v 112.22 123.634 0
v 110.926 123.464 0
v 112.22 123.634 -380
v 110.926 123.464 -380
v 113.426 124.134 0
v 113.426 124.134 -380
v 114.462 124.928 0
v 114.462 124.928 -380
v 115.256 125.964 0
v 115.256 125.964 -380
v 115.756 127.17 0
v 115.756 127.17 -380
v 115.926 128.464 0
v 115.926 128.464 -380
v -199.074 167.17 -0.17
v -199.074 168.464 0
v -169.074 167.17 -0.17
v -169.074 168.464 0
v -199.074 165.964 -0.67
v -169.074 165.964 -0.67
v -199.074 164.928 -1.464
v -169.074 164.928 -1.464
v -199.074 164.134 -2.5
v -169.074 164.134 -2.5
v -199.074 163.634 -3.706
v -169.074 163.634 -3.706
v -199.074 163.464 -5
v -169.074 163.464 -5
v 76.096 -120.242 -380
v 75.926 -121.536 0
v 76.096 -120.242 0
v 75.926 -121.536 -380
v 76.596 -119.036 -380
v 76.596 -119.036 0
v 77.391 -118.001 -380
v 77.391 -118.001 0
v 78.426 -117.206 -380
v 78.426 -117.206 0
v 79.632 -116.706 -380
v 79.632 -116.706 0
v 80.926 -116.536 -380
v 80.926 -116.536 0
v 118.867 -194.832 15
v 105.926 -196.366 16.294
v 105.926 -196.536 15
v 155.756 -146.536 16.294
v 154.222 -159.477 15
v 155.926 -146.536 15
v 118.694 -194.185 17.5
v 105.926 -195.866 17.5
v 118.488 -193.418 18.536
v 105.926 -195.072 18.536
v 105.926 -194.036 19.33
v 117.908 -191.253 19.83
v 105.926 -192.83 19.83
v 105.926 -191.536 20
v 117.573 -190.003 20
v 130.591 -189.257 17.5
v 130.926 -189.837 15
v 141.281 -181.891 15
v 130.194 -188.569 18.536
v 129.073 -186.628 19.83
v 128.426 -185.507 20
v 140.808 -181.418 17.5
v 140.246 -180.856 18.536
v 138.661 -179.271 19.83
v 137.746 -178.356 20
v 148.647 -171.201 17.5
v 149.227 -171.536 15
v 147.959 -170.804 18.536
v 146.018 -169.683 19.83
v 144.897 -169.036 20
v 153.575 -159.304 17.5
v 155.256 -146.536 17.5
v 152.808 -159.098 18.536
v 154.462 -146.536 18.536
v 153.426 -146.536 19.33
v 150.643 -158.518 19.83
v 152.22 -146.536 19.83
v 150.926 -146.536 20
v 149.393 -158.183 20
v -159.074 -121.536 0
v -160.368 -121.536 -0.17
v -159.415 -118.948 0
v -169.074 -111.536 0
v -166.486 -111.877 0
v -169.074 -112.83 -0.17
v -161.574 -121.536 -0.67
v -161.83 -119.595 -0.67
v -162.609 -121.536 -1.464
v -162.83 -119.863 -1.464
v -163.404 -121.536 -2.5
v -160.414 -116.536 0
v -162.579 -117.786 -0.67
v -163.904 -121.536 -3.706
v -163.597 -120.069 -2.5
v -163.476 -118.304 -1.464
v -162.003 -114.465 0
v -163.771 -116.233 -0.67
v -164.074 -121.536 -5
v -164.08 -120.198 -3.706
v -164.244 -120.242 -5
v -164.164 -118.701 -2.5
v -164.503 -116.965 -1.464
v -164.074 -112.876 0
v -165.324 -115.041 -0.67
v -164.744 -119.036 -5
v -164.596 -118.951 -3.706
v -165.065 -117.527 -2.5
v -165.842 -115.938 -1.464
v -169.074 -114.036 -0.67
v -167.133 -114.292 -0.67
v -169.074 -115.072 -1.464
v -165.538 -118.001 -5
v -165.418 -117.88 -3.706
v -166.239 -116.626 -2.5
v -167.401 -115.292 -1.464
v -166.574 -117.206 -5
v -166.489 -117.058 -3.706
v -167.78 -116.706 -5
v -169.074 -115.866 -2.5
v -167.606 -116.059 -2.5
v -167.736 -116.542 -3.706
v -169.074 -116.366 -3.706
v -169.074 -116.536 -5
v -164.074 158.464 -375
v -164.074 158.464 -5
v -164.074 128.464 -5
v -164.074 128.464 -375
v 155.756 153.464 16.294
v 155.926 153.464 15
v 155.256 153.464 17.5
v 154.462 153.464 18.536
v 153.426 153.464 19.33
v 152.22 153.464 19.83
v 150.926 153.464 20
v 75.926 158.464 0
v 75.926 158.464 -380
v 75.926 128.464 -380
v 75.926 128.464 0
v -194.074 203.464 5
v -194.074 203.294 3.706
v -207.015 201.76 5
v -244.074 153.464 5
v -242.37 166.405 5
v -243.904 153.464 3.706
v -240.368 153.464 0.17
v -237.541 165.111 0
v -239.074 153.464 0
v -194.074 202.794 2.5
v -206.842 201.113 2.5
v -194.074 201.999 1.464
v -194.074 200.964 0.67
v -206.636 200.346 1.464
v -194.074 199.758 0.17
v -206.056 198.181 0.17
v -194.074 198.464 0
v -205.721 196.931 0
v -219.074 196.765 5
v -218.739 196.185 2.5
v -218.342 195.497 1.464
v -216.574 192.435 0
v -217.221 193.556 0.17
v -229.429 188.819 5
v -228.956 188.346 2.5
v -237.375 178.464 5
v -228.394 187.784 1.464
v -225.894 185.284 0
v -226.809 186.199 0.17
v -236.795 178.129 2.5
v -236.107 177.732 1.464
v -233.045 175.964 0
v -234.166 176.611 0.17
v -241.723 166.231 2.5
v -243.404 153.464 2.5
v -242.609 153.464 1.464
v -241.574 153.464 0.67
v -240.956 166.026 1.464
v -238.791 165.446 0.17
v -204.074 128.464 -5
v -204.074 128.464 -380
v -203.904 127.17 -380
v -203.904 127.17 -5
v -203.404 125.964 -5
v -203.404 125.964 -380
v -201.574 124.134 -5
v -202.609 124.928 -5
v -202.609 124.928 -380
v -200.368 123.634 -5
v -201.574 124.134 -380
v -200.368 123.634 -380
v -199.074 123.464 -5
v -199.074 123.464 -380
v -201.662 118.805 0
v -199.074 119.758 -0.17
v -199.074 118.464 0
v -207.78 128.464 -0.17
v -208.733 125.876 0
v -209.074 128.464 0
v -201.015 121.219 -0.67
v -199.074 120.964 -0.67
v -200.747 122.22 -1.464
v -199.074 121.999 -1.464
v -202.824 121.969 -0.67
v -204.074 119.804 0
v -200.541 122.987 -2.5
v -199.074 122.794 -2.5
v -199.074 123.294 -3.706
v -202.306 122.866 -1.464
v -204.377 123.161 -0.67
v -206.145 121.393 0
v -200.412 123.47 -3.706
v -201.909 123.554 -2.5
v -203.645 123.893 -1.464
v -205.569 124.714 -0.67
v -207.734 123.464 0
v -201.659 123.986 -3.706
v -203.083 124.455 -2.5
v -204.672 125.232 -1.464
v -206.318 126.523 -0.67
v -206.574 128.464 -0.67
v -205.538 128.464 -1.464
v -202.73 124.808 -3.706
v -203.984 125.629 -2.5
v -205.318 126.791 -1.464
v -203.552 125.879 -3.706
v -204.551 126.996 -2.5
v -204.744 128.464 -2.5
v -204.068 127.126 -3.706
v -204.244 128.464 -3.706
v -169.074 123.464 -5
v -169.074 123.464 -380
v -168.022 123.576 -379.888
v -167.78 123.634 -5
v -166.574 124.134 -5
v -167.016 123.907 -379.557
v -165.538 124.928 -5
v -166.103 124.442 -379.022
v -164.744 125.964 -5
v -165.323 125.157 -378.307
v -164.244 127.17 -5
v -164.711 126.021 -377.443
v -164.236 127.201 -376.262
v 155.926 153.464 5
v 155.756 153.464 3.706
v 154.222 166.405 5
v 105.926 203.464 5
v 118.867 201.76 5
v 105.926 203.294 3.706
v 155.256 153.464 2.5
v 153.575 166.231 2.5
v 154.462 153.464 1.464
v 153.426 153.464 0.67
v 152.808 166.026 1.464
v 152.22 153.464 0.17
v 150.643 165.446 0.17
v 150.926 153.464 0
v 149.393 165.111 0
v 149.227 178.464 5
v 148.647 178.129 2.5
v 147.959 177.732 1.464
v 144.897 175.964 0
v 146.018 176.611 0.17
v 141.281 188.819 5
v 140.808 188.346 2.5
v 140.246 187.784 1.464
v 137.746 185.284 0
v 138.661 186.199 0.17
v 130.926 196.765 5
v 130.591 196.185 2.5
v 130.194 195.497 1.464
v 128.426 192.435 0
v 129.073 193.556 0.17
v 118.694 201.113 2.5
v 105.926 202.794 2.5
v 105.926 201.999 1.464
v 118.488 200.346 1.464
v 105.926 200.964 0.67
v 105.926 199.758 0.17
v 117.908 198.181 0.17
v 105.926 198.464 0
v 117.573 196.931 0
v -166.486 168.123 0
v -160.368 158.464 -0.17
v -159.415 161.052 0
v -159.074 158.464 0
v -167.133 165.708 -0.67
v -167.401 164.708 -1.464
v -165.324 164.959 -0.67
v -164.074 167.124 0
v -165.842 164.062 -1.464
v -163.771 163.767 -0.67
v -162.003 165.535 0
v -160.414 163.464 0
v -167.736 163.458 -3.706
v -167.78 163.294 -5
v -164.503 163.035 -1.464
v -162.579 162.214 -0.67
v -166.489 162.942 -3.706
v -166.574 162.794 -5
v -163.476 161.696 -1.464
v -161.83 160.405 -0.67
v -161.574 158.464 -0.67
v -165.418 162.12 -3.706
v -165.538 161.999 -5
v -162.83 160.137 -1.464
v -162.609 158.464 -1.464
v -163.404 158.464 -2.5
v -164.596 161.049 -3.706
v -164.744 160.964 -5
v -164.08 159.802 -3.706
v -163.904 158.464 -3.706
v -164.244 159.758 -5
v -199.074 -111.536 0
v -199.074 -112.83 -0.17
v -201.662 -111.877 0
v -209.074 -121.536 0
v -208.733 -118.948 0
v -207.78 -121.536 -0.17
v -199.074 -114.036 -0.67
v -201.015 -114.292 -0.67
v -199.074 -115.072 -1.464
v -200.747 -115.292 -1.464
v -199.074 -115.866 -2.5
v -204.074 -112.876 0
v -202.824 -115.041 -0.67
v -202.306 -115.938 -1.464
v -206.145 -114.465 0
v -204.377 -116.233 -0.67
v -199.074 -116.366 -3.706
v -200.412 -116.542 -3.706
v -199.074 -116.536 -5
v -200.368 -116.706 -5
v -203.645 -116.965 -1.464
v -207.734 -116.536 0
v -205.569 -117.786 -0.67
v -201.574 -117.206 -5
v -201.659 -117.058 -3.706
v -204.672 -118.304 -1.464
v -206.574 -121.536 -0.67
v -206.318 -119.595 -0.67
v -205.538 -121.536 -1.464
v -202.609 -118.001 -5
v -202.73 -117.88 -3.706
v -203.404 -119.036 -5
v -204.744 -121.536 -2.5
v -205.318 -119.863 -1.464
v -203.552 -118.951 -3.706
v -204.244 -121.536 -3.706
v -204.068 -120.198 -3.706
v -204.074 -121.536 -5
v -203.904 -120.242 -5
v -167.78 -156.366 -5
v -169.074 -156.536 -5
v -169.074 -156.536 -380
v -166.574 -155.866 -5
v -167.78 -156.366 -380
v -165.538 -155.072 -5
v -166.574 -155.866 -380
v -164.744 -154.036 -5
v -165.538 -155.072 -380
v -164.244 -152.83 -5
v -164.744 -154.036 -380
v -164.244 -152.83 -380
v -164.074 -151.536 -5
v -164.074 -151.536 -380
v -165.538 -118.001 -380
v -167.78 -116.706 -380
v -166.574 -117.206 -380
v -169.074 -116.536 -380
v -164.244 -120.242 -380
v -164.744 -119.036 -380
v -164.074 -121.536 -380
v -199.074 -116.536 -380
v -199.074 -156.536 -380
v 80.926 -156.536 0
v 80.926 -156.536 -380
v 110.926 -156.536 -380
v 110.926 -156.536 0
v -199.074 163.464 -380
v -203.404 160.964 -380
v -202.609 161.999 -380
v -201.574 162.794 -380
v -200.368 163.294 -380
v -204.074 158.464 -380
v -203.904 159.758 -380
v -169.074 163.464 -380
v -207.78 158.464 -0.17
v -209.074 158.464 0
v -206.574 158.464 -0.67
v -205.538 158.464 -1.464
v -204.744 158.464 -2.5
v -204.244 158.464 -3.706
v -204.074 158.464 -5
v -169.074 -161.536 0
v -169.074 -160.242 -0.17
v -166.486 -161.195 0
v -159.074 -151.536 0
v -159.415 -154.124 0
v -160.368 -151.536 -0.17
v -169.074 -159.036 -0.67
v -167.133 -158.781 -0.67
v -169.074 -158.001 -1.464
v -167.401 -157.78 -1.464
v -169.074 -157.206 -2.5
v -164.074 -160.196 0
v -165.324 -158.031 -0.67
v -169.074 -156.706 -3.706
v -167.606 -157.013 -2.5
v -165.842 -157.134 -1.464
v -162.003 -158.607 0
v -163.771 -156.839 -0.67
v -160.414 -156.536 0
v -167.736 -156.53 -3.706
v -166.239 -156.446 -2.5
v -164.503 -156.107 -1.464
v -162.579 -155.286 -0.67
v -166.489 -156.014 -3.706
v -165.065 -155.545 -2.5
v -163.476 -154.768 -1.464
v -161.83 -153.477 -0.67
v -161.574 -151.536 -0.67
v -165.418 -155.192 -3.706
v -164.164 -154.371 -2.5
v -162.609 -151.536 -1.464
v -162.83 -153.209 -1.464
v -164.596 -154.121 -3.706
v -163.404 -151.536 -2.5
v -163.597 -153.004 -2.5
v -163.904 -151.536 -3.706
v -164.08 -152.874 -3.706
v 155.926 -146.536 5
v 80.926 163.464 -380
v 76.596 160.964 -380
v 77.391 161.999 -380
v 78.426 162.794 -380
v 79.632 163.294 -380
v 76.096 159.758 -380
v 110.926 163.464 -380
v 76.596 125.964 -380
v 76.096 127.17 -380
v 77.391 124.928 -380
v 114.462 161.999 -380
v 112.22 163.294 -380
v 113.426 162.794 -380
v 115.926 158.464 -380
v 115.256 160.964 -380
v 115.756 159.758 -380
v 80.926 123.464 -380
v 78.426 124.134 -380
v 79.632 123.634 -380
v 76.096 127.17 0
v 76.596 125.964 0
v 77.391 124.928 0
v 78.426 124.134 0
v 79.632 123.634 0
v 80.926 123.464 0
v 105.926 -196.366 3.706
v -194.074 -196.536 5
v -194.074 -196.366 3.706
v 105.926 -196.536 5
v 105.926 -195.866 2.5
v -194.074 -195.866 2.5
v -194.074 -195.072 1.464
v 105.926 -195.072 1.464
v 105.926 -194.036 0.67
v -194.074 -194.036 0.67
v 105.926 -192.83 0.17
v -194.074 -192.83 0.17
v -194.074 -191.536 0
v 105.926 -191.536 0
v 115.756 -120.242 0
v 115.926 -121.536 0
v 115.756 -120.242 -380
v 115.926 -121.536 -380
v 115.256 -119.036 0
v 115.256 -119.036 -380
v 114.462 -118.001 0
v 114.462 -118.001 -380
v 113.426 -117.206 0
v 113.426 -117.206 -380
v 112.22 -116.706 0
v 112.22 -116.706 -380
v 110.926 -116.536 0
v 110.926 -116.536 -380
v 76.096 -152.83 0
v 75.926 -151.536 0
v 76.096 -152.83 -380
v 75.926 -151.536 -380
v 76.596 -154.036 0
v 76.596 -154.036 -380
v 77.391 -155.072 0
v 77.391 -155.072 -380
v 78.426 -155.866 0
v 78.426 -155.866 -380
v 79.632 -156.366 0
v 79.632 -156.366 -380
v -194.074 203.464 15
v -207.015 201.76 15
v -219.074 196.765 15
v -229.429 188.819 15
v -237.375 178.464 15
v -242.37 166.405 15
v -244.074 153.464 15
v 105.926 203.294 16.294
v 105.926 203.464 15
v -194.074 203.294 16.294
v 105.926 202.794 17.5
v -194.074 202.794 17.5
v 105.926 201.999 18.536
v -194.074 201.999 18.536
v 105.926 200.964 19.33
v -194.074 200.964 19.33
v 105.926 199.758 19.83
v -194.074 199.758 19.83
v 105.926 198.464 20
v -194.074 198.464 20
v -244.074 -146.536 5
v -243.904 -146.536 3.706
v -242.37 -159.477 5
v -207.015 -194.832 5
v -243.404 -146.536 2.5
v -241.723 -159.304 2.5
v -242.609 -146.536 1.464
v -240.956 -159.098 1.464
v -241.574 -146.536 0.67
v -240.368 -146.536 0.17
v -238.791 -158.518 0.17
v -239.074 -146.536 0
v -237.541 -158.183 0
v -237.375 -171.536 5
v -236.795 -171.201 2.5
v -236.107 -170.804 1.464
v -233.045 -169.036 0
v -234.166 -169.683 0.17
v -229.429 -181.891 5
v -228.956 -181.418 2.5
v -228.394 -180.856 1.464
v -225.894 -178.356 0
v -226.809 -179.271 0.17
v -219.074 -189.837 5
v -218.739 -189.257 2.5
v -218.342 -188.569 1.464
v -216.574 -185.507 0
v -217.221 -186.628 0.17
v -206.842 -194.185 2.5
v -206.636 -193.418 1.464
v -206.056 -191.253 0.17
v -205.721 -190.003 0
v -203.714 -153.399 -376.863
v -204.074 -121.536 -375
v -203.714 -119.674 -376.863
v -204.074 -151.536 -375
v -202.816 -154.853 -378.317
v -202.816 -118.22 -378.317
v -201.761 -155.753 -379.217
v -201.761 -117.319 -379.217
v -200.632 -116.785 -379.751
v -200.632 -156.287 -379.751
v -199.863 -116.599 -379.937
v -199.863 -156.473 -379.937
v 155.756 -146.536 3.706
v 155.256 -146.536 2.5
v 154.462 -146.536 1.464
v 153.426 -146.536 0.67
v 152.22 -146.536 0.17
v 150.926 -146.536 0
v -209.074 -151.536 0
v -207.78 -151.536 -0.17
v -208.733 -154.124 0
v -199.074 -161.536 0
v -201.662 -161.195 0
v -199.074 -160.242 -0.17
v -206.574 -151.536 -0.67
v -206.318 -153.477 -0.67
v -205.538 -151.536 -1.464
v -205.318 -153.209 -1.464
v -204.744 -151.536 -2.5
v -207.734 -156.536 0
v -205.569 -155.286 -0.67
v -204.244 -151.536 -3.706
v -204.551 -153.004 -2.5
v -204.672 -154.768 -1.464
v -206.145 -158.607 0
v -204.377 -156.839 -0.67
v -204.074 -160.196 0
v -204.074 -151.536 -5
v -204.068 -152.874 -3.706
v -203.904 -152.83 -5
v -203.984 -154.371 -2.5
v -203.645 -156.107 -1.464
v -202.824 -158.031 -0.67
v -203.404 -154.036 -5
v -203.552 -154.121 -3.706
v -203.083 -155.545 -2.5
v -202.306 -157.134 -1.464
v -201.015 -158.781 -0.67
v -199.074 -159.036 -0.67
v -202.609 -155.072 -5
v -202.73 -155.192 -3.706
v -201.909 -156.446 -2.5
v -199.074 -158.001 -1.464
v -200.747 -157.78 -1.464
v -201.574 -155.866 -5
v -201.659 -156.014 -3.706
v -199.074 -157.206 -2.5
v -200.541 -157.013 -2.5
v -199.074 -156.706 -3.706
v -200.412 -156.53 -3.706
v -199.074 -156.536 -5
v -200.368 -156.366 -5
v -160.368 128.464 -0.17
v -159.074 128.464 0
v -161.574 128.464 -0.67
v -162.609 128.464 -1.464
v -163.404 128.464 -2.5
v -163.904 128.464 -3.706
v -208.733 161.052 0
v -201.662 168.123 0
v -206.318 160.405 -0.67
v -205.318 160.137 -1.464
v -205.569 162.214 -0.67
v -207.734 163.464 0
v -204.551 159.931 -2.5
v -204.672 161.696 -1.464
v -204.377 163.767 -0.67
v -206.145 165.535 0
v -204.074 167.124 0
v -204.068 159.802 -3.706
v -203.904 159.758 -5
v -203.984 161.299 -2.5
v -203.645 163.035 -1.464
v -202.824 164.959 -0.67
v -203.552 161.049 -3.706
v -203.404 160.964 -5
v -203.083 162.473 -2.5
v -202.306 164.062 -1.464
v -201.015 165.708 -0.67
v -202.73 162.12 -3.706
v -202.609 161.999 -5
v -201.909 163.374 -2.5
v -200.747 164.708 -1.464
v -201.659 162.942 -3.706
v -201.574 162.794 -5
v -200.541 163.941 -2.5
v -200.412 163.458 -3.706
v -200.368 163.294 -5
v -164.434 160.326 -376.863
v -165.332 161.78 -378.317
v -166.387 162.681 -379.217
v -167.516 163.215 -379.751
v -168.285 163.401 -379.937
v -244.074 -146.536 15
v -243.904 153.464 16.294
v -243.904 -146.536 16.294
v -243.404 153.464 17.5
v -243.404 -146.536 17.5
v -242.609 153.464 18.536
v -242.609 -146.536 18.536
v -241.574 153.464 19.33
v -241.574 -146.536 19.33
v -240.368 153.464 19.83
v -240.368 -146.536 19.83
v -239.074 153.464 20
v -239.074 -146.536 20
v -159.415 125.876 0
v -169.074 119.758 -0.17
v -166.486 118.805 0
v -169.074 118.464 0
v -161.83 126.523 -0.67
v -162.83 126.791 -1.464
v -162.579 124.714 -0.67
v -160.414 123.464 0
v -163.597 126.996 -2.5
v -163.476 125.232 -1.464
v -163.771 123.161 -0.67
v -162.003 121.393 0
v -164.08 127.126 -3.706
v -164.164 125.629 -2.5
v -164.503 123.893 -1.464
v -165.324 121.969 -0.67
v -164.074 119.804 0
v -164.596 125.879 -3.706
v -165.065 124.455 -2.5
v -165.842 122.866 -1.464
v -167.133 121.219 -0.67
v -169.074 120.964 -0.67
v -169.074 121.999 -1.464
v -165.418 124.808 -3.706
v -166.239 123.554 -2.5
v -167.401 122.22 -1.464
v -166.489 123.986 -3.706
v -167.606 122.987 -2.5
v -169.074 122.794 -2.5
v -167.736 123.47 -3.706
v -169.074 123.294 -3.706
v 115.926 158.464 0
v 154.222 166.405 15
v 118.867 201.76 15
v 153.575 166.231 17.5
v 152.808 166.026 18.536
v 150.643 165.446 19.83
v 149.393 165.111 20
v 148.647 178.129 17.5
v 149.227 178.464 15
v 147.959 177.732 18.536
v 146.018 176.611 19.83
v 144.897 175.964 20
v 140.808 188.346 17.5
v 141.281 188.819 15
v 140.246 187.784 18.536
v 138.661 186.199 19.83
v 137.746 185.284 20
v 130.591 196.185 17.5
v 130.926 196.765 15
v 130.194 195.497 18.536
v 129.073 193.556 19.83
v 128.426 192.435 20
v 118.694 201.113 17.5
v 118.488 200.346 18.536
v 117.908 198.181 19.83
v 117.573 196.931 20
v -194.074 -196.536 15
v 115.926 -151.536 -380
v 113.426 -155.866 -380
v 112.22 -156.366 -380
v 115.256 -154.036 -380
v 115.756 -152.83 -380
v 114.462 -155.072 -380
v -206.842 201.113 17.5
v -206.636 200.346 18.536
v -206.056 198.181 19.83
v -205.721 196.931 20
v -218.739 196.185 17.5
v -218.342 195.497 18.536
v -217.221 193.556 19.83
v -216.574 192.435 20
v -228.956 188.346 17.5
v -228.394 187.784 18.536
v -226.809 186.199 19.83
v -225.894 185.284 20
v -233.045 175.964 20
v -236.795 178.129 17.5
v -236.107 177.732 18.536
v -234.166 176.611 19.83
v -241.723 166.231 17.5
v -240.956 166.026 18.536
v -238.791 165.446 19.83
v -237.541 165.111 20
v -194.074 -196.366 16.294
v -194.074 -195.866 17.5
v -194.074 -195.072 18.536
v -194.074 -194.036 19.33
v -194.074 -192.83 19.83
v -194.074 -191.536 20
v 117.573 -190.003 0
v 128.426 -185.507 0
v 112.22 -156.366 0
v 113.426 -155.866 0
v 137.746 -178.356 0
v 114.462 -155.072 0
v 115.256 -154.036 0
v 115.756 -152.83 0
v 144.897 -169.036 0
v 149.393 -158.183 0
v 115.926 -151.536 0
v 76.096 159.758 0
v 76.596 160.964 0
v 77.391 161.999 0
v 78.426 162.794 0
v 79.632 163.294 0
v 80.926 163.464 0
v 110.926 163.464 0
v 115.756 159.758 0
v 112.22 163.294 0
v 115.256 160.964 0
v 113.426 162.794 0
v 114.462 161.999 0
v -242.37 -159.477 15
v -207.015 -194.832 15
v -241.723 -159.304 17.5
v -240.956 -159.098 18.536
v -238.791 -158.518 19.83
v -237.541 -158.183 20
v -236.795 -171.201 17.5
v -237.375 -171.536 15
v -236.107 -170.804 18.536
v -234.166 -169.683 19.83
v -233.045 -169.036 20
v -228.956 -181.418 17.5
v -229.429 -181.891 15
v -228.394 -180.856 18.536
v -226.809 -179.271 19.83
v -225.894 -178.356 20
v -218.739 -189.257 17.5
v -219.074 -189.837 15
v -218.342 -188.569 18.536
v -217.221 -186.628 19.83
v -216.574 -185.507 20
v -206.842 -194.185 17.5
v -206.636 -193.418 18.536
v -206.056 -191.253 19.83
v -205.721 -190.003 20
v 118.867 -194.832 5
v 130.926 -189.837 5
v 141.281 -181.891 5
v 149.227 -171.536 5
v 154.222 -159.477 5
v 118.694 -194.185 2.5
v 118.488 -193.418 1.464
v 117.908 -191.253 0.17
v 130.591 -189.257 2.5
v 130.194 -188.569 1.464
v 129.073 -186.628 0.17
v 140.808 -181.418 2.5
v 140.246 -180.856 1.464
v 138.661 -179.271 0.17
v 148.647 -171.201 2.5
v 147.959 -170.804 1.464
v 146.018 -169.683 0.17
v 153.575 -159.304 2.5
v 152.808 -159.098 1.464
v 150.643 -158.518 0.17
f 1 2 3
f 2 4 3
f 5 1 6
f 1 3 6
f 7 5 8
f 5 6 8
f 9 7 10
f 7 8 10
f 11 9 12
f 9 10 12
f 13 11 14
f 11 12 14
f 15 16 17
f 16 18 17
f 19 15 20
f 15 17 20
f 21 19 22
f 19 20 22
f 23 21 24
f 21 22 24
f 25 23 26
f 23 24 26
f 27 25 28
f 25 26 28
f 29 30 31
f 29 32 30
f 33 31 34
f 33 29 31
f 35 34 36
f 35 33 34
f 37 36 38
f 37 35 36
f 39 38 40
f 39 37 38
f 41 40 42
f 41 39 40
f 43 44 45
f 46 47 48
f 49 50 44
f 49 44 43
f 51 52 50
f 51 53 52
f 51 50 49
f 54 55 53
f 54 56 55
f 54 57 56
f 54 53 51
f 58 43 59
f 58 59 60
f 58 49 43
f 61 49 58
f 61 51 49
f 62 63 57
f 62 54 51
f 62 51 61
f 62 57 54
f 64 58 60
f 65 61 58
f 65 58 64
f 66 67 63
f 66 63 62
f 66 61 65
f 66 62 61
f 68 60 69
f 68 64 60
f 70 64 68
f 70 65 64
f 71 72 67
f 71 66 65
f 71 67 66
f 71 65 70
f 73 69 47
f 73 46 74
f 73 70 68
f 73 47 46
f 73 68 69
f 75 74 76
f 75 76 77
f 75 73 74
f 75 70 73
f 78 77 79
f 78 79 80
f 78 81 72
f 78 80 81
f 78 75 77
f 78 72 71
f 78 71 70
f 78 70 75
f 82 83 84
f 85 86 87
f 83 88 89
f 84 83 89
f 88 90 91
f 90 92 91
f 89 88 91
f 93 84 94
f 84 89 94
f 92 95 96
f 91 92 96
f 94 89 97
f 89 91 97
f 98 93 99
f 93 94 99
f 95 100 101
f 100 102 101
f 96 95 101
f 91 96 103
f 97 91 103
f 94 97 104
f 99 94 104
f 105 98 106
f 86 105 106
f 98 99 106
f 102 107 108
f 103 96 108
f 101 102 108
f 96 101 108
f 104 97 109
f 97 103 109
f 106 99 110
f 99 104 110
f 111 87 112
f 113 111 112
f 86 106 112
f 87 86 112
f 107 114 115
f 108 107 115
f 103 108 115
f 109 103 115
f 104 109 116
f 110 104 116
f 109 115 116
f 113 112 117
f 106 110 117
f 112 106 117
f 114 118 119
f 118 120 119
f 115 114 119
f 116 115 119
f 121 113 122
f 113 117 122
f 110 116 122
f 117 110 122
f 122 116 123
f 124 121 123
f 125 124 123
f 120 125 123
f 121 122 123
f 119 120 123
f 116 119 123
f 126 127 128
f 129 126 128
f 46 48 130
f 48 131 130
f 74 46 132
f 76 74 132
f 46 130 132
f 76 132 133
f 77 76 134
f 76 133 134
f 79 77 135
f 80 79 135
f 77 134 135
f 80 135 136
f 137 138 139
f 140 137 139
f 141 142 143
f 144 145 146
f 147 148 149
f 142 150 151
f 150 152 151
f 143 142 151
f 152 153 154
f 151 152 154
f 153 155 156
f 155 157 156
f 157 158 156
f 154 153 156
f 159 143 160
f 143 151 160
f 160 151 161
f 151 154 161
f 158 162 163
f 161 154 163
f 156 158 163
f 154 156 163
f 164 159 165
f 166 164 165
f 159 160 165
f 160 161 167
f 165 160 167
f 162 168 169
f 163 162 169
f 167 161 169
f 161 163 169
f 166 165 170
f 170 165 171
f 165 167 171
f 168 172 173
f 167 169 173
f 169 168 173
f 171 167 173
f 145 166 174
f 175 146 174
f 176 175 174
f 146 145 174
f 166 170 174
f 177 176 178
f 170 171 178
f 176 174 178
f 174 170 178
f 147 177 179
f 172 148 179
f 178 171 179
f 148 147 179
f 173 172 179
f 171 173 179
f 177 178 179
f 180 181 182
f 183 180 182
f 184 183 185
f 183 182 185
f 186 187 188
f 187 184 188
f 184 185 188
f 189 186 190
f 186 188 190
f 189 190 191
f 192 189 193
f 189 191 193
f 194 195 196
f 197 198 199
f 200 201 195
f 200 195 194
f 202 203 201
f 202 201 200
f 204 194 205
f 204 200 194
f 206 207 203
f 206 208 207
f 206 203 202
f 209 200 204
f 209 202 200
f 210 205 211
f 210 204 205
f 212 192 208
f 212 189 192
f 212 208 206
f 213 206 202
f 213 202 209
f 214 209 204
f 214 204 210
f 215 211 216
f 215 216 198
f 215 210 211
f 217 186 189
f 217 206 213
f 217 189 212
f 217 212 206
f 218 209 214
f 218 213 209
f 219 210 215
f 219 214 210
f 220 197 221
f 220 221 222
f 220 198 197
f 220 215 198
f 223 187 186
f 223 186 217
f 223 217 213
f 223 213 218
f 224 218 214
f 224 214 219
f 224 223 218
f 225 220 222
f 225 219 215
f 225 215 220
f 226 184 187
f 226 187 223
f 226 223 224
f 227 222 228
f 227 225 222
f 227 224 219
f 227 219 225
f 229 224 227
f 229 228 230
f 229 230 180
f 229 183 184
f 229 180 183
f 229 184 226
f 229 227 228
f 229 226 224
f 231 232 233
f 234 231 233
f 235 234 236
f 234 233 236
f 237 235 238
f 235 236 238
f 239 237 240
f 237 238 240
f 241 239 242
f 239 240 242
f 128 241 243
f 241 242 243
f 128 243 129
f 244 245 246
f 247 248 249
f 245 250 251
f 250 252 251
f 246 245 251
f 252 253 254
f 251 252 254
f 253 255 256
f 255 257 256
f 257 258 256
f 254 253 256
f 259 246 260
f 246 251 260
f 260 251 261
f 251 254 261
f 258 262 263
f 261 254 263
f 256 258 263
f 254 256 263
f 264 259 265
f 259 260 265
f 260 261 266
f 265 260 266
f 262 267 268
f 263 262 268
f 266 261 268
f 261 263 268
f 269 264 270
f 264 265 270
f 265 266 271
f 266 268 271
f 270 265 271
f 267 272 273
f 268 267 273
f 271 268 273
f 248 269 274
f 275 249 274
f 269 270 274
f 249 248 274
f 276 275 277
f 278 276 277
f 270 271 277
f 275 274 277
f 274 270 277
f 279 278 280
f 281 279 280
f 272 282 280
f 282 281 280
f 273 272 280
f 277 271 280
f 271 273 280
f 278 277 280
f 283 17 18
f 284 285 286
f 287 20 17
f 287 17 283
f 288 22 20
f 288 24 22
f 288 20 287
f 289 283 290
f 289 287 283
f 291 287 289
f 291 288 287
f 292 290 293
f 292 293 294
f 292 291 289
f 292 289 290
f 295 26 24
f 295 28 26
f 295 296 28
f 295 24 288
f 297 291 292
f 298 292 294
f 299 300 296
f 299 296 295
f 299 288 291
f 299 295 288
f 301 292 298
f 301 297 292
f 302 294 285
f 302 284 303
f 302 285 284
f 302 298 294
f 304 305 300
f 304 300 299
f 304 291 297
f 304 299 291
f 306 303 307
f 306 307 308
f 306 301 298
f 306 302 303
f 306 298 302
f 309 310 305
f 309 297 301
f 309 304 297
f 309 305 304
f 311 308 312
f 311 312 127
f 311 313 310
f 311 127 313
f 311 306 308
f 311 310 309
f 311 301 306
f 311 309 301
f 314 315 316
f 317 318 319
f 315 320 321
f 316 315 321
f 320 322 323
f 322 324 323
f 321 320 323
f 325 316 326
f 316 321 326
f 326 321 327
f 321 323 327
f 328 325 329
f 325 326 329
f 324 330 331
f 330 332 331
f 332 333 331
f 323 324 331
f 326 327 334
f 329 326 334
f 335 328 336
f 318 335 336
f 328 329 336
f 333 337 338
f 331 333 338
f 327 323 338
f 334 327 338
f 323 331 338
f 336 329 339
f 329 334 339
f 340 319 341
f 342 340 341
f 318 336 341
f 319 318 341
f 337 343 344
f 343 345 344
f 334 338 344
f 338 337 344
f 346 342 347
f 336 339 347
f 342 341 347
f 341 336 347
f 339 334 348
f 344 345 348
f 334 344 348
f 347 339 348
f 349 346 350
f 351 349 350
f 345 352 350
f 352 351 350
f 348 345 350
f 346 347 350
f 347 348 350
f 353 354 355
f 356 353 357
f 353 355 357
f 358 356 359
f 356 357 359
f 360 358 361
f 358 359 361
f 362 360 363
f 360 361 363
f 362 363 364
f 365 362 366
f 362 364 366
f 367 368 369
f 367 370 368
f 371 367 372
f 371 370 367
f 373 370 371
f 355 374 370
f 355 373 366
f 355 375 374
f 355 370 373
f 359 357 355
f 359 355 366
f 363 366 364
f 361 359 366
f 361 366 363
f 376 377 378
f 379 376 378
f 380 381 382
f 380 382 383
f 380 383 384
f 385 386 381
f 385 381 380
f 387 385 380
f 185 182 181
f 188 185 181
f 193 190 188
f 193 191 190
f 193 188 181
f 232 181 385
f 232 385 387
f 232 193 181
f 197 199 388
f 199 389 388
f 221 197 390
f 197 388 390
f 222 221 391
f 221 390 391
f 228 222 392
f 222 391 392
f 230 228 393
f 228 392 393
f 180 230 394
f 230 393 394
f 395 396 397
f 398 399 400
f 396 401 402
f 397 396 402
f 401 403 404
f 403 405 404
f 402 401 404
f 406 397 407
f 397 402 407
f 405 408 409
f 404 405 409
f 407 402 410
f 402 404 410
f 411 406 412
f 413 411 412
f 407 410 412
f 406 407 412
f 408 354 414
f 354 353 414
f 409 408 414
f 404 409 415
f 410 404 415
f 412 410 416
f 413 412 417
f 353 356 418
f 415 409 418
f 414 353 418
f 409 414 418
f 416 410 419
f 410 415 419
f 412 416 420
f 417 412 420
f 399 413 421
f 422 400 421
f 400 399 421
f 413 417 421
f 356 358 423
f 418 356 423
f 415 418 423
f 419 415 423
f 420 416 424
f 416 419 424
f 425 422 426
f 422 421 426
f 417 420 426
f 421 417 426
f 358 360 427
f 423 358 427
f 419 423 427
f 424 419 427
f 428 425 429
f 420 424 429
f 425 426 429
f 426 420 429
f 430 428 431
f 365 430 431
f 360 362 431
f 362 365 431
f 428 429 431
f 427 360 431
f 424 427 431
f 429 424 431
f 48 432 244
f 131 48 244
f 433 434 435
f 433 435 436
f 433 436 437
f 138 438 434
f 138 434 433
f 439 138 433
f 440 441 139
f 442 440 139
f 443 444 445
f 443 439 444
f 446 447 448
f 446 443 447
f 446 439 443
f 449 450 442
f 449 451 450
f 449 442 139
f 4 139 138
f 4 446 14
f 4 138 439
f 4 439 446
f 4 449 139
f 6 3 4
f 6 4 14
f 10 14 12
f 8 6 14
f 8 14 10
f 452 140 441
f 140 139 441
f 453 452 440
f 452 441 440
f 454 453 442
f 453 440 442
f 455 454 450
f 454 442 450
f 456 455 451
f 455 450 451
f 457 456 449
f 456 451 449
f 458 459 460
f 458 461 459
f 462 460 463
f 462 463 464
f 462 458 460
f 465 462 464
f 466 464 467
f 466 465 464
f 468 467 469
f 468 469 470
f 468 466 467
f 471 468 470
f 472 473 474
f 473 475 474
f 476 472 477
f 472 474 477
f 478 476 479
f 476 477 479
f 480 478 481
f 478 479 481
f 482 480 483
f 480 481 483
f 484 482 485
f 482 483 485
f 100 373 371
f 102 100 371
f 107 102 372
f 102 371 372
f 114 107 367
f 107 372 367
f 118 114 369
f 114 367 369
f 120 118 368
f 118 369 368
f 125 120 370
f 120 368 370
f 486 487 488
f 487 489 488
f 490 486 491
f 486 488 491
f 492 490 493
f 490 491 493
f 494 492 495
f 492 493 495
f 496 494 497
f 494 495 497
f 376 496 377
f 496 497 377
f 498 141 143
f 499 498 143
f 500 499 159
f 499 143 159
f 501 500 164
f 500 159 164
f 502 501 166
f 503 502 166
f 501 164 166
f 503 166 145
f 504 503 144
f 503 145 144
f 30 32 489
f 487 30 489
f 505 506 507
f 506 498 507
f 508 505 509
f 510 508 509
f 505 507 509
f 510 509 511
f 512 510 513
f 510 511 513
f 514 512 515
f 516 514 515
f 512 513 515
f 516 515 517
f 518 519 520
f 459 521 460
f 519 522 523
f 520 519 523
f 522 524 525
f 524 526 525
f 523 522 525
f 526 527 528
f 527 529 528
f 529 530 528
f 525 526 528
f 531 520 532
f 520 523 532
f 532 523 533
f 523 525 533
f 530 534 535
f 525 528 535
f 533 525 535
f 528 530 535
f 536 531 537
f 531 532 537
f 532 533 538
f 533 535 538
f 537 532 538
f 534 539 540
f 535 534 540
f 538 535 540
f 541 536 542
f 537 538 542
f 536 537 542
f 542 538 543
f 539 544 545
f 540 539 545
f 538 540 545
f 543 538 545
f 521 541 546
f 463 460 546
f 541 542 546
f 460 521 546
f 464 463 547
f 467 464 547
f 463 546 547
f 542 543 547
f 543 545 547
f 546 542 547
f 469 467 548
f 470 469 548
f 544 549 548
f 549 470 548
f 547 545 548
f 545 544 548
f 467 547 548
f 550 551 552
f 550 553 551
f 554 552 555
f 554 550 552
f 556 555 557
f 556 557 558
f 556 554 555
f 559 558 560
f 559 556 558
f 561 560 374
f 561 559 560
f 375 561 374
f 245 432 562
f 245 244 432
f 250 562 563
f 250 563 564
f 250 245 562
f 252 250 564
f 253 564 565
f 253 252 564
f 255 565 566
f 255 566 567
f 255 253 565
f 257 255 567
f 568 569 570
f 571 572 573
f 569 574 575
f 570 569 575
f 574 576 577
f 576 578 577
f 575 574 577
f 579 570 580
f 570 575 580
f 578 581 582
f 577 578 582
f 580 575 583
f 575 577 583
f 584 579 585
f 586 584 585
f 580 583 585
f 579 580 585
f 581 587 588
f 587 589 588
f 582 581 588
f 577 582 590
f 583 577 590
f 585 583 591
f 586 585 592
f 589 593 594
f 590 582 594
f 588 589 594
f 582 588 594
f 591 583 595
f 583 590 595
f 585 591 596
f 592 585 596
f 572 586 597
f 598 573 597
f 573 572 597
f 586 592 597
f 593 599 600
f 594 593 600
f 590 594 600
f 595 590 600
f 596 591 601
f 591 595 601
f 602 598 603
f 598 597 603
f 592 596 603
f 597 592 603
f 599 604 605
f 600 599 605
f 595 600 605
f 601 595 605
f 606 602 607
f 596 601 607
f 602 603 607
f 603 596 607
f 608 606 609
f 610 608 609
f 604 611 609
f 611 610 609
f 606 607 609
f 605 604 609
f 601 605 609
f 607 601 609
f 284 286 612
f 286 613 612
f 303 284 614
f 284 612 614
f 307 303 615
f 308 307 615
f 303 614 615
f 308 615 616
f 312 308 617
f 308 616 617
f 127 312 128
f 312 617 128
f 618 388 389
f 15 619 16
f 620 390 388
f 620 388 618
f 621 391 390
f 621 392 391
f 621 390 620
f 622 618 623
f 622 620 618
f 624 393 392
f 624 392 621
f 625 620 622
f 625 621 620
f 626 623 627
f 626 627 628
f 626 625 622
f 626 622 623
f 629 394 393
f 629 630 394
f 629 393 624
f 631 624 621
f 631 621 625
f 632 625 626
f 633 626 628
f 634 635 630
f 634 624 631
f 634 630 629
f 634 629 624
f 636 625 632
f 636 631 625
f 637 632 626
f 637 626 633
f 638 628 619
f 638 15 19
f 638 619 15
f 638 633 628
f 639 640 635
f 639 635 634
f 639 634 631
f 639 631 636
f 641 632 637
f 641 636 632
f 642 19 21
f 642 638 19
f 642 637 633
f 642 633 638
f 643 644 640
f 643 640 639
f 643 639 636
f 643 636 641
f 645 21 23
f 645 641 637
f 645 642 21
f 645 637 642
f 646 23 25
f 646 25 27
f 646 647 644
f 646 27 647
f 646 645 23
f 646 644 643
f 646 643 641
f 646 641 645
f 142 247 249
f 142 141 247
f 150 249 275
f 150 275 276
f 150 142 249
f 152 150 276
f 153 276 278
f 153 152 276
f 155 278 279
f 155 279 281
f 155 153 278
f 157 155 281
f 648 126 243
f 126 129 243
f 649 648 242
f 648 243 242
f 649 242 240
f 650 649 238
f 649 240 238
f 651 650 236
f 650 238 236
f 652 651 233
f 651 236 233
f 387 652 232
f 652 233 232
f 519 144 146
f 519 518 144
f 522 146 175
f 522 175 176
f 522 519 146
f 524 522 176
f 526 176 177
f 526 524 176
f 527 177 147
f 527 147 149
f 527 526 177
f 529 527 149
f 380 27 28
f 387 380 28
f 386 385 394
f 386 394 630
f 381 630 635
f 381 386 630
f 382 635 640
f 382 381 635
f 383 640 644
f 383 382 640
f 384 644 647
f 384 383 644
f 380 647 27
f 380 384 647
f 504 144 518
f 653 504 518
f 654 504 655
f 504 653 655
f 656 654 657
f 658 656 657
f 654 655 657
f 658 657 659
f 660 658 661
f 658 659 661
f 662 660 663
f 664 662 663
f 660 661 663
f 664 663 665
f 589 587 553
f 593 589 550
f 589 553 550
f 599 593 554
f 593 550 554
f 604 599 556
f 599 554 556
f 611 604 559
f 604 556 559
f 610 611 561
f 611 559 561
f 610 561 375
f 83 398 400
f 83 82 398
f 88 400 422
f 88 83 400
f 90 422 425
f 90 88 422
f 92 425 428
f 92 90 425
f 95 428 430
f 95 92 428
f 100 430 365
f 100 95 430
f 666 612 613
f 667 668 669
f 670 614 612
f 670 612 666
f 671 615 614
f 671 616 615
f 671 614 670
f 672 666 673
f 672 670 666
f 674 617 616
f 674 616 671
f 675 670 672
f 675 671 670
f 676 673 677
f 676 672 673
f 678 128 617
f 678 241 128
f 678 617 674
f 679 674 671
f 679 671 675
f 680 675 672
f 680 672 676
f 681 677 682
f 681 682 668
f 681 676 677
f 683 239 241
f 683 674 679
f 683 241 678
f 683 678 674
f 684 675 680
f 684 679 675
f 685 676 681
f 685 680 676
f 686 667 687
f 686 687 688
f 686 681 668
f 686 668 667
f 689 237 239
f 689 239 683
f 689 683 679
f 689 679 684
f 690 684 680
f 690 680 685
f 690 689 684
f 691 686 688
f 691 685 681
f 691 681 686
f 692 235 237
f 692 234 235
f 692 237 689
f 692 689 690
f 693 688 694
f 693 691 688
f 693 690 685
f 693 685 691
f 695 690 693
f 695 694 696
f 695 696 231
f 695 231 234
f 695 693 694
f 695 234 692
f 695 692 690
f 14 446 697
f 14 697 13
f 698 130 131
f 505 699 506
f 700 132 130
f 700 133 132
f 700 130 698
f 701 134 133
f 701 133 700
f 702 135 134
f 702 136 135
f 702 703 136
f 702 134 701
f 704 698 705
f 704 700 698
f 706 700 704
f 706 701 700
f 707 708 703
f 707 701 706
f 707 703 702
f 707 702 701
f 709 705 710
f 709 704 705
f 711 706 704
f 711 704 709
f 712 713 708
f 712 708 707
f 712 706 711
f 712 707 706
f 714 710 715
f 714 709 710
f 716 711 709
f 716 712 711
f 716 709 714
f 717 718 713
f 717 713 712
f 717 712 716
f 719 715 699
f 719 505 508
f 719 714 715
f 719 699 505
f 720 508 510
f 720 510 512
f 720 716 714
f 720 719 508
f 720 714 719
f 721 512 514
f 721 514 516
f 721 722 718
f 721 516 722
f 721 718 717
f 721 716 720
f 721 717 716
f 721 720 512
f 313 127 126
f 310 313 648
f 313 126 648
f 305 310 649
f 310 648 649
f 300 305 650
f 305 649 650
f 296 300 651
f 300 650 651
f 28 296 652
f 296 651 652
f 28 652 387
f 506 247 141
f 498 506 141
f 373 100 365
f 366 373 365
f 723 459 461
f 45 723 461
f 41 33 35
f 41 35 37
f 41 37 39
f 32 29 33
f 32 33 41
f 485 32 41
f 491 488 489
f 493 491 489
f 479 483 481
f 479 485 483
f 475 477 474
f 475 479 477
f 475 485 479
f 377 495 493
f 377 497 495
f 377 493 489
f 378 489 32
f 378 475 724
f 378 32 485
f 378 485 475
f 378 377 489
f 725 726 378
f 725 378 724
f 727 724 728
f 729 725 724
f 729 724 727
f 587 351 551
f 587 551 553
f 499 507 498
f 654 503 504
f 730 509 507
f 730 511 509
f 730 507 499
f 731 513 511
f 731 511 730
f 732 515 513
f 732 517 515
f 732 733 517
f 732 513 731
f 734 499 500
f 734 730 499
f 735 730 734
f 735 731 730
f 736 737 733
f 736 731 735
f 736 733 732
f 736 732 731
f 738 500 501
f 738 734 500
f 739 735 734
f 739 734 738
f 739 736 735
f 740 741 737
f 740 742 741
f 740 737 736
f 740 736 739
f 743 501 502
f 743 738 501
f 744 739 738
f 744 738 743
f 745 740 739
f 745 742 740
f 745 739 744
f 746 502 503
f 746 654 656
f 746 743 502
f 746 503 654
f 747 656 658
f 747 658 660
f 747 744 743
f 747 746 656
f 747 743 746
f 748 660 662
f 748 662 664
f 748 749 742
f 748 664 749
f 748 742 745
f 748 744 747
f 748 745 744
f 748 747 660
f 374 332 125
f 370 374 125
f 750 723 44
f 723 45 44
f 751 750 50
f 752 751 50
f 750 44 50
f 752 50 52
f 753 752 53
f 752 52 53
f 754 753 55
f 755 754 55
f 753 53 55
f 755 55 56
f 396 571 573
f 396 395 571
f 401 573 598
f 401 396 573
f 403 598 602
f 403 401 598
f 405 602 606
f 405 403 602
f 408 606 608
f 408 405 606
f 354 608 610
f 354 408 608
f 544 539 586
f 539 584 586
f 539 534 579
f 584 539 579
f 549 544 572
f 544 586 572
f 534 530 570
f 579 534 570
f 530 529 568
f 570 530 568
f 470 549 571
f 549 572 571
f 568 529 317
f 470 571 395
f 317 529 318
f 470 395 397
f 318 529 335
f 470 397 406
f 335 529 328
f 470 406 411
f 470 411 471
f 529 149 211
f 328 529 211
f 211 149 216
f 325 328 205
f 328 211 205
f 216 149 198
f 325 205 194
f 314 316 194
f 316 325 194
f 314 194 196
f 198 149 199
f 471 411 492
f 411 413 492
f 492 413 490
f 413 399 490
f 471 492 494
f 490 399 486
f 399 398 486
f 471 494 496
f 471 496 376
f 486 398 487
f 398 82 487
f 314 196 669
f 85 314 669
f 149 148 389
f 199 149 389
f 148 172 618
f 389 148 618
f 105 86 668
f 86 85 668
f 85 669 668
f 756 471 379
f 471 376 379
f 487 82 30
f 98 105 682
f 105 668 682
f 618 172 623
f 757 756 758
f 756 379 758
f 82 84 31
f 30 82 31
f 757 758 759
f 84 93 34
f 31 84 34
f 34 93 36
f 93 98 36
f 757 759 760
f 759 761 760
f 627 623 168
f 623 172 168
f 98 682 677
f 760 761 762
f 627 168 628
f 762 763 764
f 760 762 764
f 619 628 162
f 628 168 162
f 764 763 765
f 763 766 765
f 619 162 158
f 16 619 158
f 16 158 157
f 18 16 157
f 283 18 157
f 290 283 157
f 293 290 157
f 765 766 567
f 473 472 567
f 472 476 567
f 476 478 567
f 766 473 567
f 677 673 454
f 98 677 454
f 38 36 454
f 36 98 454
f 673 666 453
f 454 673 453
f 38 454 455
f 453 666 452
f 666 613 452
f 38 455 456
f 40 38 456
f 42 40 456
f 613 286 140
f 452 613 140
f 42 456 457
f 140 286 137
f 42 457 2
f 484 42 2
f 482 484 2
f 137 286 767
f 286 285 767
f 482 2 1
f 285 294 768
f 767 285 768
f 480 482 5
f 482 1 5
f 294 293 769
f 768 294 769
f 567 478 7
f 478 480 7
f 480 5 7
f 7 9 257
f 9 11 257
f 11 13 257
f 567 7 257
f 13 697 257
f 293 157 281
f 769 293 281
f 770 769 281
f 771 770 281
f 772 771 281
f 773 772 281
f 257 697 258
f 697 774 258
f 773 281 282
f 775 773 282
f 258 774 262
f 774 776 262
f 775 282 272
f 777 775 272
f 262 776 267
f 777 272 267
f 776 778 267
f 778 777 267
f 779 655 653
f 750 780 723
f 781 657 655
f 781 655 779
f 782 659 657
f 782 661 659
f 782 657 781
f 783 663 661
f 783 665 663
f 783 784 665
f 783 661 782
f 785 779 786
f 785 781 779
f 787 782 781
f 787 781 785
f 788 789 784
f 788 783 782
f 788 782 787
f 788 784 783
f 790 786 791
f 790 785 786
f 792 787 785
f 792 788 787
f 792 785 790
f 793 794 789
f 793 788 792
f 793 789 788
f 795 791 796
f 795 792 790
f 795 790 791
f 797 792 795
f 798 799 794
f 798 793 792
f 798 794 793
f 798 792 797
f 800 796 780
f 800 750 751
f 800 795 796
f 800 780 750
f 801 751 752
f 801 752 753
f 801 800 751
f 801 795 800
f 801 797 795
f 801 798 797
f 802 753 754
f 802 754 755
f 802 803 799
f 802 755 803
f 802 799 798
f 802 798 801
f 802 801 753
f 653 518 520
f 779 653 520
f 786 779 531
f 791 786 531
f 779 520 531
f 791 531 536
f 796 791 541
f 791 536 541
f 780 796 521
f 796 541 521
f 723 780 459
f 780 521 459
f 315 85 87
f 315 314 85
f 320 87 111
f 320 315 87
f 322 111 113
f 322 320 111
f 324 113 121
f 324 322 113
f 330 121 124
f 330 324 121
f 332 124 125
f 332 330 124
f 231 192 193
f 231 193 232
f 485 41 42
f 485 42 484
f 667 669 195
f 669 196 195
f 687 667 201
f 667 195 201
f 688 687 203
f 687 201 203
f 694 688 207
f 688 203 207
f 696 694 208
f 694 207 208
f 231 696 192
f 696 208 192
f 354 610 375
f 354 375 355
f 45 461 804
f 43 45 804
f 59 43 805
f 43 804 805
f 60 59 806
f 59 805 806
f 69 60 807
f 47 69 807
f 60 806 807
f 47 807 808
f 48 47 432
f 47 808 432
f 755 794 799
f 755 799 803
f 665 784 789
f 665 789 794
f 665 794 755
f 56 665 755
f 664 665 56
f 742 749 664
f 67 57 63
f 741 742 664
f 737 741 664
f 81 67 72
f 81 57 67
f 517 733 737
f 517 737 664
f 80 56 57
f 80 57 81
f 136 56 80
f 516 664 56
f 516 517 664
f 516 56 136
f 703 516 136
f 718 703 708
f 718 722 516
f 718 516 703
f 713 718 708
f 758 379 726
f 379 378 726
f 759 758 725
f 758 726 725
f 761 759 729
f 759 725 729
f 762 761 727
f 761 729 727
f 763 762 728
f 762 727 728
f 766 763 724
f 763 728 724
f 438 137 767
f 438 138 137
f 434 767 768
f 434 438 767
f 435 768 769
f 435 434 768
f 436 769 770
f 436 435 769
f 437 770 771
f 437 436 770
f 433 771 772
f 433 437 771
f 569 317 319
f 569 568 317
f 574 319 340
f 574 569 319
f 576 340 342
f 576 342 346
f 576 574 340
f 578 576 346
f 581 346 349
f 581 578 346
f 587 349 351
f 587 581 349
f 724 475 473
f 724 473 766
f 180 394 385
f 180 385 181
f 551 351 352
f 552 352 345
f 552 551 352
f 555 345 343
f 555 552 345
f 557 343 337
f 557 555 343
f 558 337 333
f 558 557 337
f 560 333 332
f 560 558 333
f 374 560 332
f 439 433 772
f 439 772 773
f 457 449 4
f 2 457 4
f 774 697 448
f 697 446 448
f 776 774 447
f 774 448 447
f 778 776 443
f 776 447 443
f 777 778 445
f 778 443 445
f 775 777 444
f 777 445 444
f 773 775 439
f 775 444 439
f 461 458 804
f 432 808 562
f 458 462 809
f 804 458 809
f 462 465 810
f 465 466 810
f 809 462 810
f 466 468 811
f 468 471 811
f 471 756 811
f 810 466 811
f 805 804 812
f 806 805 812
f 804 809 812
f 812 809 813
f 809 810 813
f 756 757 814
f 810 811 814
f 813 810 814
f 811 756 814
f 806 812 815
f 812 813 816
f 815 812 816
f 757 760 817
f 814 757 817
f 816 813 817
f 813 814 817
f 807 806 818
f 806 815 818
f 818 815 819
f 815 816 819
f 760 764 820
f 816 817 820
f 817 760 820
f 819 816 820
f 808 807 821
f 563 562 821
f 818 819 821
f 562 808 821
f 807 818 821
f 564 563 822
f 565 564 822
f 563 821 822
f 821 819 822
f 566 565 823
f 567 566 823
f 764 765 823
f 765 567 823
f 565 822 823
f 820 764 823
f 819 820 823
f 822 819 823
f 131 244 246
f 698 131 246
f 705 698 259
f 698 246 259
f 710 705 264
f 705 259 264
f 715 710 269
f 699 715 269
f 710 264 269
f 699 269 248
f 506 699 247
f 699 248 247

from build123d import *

# Parameters (mm, degrees)
F1_DEPTH = 20
F2_R     = 5
F3_W     = 40
F3_H     = 40
F4_DEPTH = 380
F5_F1_R  = 5
F5_F2_R  = 5
F6_R     = 5


with BuildPart() as f1:
    # F0 (on Top) → F1 (new body)
    with BuildSketch(Plane.XY):
        with BuildLine():
            Line((105.9260419756, 203.463898824), (-194.0739580244, 203.463898824))
            ThreePointArc((-194.0739580244, 203.463898824), (-229.4292970837, 188.8192378834), (-244.0739580244, 153.463898824))
            Line((-244.0739580244, 153.463898824), (-244.0739580244, -146.536101176))
            ThreePointArc((-244.0739580244, -146.536101176), (-229.4292970837, -181.8914402353), (-194.0739580244, -196.536101176))
            Line((-194.0739580244, -196.536101176), (105.9260419756, -196.536101176))
            ThreePointArc((105.9260419756, -196.536101176), (141.2813810349, -181.8914402353), (155.9260419756, -146.536101176))
            Line((155.9260419756, -146.536101176), (155.9260419756, 153.463898824))
            ThreePointArc((155.9260419756, 153.463898824), (141.2813810349, 188.8192378834), (105.9260419756, 203.463898824))
        make_face()
    extrude(amount=F1_DEPTH)

    # F2
    f2_edges = [f1.edges().sort_by_distance(p)[0] for p in [
        (-44.073958, 203.463899, 0),
        (-229.429297, 188.819238, 0),
        (-244.073958, 3.463899, 0),
        (-229.429297, -181.89144, 0),
        (-44.073958, -196.536101, 0),
        (141.281381, -181.89144, 0),
        (155.926042, 3.463899, 0),
        (141.281381, 188.819238, 0),
    ]]
    fillet(f2_edges, radius=F2_R)

    # F3 (on face) → F4 (join)
    with BuildSketch(Plane(origin=(0, 0, 0), x_dir=(1, 0, 0), z_dir=(0, 0, -1))):
        with Locations((95.9260419756, 136.536101176)):
            Rectangle(F3_W, F3_H)
        with Locations((95.9260419756, -143.463898824)):
            Rectangle(F3_W, F3_H)
        with Locations((-184.0739580244, -143.463898824)):
            Rectangle(F3_W, F3_H)
        with Locations((-184.0739580244, 136.536101176)):
            Rectangle(F3_W, F3_H)
    extrude(amount=F4_DEPTH)

    # F5: fillet of radius 5 on 20 edges, made by hand

    # F5_f1
    f5_f1_edges = [f1.edges().sort_by_distance(p)[0] for p in [
        (-164.0739580244, -156.536101176, -190),
        (-164.0739580244, -116.536101176, -190),
        (-204.0739580244, -156.536101176, -190),
        (-204.0739580244, -116.536101176, -190),
        (-204.0739580244, -136.536101176, -380),
        (75.9260419756, -156.536101176, -190),
        (115.9260419756, -156.536101176, -190),
        (115.9260419756, -116.536101176, -190),
        (75.9260419756, -116.536101176, -190),
        (115.9260419756, 123.463898824, -190),
        (115.9260419756, 163.463898824, -190),
        (75.9260419756, 163.463898824, -190),
        (75.9260419756, 123.463898824, -190),
        (-204.0739580244, 163.463898824, -190),
        (-204.0739580244, 123.463898824, -190),
        (-164.0739580244, 163.463898824, -190),
        (-164.0739580244, 123.463898824, -190),
        (-164.0739580244, 143.463898824, -380),
    ]]
    fillet(f5_f1_edges, radius=F5_F1_R)

    # F5_f2
    f5_f2_edges = [f1.edges().sort_by_distance(p)[0] for p in [
        (-204.0739580244, -136.536101176, 0),
        (-164.0739580244, 143.463898824, 0),
        (-165.5384241184, 161.99943273, 0),
        (-165.5384241184, 124.9283649181, 0),
        (-202.6094919303, -155.0716350819, 0),
        (-202.6094919303, -118.00056727, 0),
    ]]
    fillet(f5_f2_edges, radius=F5_F2_R)

    # F6
    f6_edges = [f1.edges().sort_by_distance(p)[0] for p in [
        (-44.073958, 203.463899, 20),
        (-229.429297, 188.819238, 20),
        (-244.073958, 3.463899, 20),
        (-229.429297, -181.89144, 20),
        (-44.073958, -196.536101, 20),
        (141.281381, -181.89144, 20),
        (155.926042, 3.463899, 20),
        (141.281381, 188.819238, 20),
    ]]
    fillet(f6_edges, radius=F6_R)


solid = f1.part
